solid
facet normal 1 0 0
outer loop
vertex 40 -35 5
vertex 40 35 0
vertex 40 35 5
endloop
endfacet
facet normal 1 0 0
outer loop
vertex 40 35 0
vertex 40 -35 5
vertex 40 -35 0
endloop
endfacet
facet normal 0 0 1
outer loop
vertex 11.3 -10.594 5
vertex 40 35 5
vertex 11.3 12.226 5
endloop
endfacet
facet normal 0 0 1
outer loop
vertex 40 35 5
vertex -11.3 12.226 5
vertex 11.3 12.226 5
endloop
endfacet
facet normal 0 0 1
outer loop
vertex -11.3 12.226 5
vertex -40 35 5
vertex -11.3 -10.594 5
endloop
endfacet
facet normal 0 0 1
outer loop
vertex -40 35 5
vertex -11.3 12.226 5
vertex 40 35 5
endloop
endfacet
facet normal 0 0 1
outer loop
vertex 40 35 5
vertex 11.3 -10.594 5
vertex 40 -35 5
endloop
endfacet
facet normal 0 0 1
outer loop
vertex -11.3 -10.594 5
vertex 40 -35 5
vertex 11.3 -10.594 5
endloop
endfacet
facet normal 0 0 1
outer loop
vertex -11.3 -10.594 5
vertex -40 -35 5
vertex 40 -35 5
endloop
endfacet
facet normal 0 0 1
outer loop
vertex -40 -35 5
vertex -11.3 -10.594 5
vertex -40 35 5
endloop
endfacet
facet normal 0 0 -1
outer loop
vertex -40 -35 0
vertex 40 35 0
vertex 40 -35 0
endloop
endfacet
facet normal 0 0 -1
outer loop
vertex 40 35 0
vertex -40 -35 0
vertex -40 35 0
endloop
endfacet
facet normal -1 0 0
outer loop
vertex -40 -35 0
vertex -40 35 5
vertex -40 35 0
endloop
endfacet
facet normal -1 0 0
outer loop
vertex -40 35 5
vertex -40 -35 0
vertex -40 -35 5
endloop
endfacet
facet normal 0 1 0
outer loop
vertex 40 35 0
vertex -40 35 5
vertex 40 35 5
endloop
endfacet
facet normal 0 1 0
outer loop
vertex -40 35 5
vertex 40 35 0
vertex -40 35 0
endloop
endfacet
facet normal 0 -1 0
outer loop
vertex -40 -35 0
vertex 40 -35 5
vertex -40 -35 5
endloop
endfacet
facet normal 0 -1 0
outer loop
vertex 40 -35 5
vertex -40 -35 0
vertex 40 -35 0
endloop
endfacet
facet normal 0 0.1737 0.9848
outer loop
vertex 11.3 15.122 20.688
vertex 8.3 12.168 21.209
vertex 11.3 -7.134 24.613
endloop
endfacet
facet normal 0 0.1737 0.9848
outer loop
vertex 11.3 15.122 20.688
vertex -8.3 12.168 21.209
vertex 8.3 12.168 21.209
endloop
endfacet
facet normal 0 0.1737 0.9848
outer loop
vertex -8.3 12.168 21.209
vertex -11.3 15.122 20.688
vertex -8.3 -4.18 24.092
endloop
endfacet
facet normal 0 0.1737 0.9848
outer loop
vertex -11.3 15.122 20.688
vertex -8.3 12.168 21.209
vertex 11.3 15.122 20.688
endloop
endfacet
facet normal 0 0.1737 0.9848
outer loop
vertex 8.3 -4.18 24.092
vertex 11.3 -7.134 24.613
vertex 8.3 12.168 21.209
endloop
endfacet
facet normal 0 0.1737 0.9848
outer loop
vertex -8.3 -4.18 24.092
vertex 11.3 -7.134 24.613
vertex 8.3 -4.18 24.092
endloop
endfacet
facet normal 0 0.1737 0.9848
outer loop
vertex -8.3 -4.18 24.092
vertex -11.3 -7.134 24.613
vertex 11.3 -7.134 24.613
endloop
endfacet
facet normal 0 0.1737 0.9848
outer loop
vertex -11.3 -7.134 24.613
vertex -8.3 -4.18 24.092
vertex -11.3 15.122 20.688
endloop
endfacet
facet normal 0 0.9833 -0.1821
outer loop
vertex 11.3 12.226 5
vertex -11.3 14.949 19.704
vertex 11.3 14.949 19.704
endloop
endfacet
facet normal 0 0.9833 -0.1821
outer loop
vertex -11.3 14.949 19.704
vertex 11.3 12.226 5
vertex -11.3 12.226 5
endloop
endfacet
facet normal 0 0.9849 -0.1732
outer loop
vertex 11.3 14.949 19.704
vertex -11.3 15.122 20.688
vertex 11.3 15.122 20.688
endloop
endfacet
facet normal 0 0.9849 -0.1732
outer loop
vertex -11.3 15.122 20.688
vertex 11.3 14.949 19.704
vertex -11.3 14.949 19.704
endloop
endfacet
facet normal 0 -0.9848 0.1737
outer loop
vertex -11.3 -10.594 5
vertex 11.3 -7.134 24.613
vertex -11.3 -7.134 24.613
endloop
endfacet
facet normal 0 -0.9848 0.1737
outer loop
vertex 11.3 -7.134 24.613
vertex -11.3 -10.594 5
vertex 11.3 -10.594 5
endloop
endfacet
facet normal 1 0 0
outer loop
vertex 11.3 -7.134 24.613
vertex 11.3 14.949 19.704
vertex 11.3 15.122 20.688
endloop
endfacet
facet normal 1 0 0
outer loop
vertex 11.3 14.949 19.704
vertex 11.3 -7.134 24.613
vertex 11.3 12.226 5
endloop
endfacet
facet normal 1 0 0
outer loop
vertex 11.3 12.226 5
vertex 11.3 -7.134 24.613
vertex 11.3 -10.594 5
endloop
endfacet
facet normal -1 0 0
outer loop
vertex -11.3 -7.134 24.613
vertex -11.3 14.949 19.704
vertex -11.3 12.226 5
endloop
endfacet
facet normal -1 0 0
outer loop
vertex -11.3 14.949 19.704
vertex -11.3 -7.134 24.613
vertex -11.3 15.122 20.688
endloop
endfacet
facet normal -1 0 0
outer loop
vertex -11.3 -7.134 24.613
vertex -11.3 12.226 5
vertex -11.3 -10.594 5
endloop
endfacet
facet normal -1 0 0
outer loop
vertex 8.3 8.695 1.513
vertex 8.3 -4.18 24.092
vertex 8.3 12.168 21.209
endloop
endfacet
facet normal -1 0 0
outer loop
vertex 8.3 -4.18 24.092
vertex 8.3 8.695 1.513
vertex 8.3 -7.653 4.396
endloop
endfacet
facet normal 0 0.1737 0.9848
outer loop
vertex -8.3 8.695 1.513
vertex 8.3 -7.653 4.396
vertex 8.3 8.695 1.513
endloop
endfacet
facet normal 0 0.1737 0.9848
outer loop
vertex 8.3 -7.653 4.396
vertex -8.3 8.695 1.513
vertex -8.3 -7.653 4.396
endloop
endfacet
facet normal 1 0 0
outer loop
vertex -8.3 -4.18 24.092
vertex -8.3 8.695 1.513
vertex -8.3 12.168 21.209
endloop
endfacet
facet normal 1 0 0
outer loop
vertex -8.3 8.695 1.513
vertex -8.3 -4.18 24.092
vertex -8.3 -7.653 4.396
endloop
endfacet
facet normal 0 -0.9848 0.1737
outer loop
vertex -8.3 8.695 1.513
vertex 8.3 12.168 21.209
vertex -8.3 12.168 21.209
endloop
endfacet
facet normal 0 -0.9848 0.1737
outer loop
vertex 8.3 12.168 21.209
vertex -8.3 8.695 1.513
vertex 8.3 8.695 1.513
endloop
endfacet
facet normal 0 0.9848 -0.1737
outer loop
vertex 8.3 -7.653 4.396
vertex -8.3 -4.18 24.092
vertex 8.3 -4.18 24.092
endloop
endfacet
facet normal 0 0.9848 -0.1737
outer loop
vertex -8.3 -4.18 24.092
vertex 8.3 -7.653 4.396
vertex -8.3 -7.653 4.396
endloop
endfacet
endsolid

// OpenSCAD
// Desk foot for eye_test_stand.scad: a weighted base with a socket the stand's stem plugs into,
// tilted back so the eye looks up 10 deg (a seated person at a desk). Print flat, no supports.
include <../params.scad>

stem     = [16, 16];            // the stand's stem cross-section
fit      = 0.3;                 // each side: snug push fit
tilt     = 10;                  // eye looks up this much
base     = [80, 70, 5];
sock_h   = 22;                  // socket depth along the stem
block    = [stem[0] + 2 * fit + 6, stem[1] + 2 * fit + 6];

difference() {
    union() {
        translate([-base[0] / 2, -base[1] / 2, 0]) cube(base);
        // socket block, leaning back by `tilt`
        hull() {
            translate([-block[0] / 2, -block[1] / 2, 0]) cube([block[0], block[1], 1]);
            rotate([-tilt, 0, 0]) translate([-block[0] / 2, -block[1] / 2, sock_h]) cube([block[0], block[1], 1]);
        }
    }
    // the socket (open at the top, along the tilted axis)
    rotate([-tilt, 0, 0]) translate([-(stem[0] / 2 + fit), -(stem[1] / 2 + fit), 3])
        cube([stem[0] + 2 * fit, stem[1] + 2 * fit, sock_h + 10]);
}
